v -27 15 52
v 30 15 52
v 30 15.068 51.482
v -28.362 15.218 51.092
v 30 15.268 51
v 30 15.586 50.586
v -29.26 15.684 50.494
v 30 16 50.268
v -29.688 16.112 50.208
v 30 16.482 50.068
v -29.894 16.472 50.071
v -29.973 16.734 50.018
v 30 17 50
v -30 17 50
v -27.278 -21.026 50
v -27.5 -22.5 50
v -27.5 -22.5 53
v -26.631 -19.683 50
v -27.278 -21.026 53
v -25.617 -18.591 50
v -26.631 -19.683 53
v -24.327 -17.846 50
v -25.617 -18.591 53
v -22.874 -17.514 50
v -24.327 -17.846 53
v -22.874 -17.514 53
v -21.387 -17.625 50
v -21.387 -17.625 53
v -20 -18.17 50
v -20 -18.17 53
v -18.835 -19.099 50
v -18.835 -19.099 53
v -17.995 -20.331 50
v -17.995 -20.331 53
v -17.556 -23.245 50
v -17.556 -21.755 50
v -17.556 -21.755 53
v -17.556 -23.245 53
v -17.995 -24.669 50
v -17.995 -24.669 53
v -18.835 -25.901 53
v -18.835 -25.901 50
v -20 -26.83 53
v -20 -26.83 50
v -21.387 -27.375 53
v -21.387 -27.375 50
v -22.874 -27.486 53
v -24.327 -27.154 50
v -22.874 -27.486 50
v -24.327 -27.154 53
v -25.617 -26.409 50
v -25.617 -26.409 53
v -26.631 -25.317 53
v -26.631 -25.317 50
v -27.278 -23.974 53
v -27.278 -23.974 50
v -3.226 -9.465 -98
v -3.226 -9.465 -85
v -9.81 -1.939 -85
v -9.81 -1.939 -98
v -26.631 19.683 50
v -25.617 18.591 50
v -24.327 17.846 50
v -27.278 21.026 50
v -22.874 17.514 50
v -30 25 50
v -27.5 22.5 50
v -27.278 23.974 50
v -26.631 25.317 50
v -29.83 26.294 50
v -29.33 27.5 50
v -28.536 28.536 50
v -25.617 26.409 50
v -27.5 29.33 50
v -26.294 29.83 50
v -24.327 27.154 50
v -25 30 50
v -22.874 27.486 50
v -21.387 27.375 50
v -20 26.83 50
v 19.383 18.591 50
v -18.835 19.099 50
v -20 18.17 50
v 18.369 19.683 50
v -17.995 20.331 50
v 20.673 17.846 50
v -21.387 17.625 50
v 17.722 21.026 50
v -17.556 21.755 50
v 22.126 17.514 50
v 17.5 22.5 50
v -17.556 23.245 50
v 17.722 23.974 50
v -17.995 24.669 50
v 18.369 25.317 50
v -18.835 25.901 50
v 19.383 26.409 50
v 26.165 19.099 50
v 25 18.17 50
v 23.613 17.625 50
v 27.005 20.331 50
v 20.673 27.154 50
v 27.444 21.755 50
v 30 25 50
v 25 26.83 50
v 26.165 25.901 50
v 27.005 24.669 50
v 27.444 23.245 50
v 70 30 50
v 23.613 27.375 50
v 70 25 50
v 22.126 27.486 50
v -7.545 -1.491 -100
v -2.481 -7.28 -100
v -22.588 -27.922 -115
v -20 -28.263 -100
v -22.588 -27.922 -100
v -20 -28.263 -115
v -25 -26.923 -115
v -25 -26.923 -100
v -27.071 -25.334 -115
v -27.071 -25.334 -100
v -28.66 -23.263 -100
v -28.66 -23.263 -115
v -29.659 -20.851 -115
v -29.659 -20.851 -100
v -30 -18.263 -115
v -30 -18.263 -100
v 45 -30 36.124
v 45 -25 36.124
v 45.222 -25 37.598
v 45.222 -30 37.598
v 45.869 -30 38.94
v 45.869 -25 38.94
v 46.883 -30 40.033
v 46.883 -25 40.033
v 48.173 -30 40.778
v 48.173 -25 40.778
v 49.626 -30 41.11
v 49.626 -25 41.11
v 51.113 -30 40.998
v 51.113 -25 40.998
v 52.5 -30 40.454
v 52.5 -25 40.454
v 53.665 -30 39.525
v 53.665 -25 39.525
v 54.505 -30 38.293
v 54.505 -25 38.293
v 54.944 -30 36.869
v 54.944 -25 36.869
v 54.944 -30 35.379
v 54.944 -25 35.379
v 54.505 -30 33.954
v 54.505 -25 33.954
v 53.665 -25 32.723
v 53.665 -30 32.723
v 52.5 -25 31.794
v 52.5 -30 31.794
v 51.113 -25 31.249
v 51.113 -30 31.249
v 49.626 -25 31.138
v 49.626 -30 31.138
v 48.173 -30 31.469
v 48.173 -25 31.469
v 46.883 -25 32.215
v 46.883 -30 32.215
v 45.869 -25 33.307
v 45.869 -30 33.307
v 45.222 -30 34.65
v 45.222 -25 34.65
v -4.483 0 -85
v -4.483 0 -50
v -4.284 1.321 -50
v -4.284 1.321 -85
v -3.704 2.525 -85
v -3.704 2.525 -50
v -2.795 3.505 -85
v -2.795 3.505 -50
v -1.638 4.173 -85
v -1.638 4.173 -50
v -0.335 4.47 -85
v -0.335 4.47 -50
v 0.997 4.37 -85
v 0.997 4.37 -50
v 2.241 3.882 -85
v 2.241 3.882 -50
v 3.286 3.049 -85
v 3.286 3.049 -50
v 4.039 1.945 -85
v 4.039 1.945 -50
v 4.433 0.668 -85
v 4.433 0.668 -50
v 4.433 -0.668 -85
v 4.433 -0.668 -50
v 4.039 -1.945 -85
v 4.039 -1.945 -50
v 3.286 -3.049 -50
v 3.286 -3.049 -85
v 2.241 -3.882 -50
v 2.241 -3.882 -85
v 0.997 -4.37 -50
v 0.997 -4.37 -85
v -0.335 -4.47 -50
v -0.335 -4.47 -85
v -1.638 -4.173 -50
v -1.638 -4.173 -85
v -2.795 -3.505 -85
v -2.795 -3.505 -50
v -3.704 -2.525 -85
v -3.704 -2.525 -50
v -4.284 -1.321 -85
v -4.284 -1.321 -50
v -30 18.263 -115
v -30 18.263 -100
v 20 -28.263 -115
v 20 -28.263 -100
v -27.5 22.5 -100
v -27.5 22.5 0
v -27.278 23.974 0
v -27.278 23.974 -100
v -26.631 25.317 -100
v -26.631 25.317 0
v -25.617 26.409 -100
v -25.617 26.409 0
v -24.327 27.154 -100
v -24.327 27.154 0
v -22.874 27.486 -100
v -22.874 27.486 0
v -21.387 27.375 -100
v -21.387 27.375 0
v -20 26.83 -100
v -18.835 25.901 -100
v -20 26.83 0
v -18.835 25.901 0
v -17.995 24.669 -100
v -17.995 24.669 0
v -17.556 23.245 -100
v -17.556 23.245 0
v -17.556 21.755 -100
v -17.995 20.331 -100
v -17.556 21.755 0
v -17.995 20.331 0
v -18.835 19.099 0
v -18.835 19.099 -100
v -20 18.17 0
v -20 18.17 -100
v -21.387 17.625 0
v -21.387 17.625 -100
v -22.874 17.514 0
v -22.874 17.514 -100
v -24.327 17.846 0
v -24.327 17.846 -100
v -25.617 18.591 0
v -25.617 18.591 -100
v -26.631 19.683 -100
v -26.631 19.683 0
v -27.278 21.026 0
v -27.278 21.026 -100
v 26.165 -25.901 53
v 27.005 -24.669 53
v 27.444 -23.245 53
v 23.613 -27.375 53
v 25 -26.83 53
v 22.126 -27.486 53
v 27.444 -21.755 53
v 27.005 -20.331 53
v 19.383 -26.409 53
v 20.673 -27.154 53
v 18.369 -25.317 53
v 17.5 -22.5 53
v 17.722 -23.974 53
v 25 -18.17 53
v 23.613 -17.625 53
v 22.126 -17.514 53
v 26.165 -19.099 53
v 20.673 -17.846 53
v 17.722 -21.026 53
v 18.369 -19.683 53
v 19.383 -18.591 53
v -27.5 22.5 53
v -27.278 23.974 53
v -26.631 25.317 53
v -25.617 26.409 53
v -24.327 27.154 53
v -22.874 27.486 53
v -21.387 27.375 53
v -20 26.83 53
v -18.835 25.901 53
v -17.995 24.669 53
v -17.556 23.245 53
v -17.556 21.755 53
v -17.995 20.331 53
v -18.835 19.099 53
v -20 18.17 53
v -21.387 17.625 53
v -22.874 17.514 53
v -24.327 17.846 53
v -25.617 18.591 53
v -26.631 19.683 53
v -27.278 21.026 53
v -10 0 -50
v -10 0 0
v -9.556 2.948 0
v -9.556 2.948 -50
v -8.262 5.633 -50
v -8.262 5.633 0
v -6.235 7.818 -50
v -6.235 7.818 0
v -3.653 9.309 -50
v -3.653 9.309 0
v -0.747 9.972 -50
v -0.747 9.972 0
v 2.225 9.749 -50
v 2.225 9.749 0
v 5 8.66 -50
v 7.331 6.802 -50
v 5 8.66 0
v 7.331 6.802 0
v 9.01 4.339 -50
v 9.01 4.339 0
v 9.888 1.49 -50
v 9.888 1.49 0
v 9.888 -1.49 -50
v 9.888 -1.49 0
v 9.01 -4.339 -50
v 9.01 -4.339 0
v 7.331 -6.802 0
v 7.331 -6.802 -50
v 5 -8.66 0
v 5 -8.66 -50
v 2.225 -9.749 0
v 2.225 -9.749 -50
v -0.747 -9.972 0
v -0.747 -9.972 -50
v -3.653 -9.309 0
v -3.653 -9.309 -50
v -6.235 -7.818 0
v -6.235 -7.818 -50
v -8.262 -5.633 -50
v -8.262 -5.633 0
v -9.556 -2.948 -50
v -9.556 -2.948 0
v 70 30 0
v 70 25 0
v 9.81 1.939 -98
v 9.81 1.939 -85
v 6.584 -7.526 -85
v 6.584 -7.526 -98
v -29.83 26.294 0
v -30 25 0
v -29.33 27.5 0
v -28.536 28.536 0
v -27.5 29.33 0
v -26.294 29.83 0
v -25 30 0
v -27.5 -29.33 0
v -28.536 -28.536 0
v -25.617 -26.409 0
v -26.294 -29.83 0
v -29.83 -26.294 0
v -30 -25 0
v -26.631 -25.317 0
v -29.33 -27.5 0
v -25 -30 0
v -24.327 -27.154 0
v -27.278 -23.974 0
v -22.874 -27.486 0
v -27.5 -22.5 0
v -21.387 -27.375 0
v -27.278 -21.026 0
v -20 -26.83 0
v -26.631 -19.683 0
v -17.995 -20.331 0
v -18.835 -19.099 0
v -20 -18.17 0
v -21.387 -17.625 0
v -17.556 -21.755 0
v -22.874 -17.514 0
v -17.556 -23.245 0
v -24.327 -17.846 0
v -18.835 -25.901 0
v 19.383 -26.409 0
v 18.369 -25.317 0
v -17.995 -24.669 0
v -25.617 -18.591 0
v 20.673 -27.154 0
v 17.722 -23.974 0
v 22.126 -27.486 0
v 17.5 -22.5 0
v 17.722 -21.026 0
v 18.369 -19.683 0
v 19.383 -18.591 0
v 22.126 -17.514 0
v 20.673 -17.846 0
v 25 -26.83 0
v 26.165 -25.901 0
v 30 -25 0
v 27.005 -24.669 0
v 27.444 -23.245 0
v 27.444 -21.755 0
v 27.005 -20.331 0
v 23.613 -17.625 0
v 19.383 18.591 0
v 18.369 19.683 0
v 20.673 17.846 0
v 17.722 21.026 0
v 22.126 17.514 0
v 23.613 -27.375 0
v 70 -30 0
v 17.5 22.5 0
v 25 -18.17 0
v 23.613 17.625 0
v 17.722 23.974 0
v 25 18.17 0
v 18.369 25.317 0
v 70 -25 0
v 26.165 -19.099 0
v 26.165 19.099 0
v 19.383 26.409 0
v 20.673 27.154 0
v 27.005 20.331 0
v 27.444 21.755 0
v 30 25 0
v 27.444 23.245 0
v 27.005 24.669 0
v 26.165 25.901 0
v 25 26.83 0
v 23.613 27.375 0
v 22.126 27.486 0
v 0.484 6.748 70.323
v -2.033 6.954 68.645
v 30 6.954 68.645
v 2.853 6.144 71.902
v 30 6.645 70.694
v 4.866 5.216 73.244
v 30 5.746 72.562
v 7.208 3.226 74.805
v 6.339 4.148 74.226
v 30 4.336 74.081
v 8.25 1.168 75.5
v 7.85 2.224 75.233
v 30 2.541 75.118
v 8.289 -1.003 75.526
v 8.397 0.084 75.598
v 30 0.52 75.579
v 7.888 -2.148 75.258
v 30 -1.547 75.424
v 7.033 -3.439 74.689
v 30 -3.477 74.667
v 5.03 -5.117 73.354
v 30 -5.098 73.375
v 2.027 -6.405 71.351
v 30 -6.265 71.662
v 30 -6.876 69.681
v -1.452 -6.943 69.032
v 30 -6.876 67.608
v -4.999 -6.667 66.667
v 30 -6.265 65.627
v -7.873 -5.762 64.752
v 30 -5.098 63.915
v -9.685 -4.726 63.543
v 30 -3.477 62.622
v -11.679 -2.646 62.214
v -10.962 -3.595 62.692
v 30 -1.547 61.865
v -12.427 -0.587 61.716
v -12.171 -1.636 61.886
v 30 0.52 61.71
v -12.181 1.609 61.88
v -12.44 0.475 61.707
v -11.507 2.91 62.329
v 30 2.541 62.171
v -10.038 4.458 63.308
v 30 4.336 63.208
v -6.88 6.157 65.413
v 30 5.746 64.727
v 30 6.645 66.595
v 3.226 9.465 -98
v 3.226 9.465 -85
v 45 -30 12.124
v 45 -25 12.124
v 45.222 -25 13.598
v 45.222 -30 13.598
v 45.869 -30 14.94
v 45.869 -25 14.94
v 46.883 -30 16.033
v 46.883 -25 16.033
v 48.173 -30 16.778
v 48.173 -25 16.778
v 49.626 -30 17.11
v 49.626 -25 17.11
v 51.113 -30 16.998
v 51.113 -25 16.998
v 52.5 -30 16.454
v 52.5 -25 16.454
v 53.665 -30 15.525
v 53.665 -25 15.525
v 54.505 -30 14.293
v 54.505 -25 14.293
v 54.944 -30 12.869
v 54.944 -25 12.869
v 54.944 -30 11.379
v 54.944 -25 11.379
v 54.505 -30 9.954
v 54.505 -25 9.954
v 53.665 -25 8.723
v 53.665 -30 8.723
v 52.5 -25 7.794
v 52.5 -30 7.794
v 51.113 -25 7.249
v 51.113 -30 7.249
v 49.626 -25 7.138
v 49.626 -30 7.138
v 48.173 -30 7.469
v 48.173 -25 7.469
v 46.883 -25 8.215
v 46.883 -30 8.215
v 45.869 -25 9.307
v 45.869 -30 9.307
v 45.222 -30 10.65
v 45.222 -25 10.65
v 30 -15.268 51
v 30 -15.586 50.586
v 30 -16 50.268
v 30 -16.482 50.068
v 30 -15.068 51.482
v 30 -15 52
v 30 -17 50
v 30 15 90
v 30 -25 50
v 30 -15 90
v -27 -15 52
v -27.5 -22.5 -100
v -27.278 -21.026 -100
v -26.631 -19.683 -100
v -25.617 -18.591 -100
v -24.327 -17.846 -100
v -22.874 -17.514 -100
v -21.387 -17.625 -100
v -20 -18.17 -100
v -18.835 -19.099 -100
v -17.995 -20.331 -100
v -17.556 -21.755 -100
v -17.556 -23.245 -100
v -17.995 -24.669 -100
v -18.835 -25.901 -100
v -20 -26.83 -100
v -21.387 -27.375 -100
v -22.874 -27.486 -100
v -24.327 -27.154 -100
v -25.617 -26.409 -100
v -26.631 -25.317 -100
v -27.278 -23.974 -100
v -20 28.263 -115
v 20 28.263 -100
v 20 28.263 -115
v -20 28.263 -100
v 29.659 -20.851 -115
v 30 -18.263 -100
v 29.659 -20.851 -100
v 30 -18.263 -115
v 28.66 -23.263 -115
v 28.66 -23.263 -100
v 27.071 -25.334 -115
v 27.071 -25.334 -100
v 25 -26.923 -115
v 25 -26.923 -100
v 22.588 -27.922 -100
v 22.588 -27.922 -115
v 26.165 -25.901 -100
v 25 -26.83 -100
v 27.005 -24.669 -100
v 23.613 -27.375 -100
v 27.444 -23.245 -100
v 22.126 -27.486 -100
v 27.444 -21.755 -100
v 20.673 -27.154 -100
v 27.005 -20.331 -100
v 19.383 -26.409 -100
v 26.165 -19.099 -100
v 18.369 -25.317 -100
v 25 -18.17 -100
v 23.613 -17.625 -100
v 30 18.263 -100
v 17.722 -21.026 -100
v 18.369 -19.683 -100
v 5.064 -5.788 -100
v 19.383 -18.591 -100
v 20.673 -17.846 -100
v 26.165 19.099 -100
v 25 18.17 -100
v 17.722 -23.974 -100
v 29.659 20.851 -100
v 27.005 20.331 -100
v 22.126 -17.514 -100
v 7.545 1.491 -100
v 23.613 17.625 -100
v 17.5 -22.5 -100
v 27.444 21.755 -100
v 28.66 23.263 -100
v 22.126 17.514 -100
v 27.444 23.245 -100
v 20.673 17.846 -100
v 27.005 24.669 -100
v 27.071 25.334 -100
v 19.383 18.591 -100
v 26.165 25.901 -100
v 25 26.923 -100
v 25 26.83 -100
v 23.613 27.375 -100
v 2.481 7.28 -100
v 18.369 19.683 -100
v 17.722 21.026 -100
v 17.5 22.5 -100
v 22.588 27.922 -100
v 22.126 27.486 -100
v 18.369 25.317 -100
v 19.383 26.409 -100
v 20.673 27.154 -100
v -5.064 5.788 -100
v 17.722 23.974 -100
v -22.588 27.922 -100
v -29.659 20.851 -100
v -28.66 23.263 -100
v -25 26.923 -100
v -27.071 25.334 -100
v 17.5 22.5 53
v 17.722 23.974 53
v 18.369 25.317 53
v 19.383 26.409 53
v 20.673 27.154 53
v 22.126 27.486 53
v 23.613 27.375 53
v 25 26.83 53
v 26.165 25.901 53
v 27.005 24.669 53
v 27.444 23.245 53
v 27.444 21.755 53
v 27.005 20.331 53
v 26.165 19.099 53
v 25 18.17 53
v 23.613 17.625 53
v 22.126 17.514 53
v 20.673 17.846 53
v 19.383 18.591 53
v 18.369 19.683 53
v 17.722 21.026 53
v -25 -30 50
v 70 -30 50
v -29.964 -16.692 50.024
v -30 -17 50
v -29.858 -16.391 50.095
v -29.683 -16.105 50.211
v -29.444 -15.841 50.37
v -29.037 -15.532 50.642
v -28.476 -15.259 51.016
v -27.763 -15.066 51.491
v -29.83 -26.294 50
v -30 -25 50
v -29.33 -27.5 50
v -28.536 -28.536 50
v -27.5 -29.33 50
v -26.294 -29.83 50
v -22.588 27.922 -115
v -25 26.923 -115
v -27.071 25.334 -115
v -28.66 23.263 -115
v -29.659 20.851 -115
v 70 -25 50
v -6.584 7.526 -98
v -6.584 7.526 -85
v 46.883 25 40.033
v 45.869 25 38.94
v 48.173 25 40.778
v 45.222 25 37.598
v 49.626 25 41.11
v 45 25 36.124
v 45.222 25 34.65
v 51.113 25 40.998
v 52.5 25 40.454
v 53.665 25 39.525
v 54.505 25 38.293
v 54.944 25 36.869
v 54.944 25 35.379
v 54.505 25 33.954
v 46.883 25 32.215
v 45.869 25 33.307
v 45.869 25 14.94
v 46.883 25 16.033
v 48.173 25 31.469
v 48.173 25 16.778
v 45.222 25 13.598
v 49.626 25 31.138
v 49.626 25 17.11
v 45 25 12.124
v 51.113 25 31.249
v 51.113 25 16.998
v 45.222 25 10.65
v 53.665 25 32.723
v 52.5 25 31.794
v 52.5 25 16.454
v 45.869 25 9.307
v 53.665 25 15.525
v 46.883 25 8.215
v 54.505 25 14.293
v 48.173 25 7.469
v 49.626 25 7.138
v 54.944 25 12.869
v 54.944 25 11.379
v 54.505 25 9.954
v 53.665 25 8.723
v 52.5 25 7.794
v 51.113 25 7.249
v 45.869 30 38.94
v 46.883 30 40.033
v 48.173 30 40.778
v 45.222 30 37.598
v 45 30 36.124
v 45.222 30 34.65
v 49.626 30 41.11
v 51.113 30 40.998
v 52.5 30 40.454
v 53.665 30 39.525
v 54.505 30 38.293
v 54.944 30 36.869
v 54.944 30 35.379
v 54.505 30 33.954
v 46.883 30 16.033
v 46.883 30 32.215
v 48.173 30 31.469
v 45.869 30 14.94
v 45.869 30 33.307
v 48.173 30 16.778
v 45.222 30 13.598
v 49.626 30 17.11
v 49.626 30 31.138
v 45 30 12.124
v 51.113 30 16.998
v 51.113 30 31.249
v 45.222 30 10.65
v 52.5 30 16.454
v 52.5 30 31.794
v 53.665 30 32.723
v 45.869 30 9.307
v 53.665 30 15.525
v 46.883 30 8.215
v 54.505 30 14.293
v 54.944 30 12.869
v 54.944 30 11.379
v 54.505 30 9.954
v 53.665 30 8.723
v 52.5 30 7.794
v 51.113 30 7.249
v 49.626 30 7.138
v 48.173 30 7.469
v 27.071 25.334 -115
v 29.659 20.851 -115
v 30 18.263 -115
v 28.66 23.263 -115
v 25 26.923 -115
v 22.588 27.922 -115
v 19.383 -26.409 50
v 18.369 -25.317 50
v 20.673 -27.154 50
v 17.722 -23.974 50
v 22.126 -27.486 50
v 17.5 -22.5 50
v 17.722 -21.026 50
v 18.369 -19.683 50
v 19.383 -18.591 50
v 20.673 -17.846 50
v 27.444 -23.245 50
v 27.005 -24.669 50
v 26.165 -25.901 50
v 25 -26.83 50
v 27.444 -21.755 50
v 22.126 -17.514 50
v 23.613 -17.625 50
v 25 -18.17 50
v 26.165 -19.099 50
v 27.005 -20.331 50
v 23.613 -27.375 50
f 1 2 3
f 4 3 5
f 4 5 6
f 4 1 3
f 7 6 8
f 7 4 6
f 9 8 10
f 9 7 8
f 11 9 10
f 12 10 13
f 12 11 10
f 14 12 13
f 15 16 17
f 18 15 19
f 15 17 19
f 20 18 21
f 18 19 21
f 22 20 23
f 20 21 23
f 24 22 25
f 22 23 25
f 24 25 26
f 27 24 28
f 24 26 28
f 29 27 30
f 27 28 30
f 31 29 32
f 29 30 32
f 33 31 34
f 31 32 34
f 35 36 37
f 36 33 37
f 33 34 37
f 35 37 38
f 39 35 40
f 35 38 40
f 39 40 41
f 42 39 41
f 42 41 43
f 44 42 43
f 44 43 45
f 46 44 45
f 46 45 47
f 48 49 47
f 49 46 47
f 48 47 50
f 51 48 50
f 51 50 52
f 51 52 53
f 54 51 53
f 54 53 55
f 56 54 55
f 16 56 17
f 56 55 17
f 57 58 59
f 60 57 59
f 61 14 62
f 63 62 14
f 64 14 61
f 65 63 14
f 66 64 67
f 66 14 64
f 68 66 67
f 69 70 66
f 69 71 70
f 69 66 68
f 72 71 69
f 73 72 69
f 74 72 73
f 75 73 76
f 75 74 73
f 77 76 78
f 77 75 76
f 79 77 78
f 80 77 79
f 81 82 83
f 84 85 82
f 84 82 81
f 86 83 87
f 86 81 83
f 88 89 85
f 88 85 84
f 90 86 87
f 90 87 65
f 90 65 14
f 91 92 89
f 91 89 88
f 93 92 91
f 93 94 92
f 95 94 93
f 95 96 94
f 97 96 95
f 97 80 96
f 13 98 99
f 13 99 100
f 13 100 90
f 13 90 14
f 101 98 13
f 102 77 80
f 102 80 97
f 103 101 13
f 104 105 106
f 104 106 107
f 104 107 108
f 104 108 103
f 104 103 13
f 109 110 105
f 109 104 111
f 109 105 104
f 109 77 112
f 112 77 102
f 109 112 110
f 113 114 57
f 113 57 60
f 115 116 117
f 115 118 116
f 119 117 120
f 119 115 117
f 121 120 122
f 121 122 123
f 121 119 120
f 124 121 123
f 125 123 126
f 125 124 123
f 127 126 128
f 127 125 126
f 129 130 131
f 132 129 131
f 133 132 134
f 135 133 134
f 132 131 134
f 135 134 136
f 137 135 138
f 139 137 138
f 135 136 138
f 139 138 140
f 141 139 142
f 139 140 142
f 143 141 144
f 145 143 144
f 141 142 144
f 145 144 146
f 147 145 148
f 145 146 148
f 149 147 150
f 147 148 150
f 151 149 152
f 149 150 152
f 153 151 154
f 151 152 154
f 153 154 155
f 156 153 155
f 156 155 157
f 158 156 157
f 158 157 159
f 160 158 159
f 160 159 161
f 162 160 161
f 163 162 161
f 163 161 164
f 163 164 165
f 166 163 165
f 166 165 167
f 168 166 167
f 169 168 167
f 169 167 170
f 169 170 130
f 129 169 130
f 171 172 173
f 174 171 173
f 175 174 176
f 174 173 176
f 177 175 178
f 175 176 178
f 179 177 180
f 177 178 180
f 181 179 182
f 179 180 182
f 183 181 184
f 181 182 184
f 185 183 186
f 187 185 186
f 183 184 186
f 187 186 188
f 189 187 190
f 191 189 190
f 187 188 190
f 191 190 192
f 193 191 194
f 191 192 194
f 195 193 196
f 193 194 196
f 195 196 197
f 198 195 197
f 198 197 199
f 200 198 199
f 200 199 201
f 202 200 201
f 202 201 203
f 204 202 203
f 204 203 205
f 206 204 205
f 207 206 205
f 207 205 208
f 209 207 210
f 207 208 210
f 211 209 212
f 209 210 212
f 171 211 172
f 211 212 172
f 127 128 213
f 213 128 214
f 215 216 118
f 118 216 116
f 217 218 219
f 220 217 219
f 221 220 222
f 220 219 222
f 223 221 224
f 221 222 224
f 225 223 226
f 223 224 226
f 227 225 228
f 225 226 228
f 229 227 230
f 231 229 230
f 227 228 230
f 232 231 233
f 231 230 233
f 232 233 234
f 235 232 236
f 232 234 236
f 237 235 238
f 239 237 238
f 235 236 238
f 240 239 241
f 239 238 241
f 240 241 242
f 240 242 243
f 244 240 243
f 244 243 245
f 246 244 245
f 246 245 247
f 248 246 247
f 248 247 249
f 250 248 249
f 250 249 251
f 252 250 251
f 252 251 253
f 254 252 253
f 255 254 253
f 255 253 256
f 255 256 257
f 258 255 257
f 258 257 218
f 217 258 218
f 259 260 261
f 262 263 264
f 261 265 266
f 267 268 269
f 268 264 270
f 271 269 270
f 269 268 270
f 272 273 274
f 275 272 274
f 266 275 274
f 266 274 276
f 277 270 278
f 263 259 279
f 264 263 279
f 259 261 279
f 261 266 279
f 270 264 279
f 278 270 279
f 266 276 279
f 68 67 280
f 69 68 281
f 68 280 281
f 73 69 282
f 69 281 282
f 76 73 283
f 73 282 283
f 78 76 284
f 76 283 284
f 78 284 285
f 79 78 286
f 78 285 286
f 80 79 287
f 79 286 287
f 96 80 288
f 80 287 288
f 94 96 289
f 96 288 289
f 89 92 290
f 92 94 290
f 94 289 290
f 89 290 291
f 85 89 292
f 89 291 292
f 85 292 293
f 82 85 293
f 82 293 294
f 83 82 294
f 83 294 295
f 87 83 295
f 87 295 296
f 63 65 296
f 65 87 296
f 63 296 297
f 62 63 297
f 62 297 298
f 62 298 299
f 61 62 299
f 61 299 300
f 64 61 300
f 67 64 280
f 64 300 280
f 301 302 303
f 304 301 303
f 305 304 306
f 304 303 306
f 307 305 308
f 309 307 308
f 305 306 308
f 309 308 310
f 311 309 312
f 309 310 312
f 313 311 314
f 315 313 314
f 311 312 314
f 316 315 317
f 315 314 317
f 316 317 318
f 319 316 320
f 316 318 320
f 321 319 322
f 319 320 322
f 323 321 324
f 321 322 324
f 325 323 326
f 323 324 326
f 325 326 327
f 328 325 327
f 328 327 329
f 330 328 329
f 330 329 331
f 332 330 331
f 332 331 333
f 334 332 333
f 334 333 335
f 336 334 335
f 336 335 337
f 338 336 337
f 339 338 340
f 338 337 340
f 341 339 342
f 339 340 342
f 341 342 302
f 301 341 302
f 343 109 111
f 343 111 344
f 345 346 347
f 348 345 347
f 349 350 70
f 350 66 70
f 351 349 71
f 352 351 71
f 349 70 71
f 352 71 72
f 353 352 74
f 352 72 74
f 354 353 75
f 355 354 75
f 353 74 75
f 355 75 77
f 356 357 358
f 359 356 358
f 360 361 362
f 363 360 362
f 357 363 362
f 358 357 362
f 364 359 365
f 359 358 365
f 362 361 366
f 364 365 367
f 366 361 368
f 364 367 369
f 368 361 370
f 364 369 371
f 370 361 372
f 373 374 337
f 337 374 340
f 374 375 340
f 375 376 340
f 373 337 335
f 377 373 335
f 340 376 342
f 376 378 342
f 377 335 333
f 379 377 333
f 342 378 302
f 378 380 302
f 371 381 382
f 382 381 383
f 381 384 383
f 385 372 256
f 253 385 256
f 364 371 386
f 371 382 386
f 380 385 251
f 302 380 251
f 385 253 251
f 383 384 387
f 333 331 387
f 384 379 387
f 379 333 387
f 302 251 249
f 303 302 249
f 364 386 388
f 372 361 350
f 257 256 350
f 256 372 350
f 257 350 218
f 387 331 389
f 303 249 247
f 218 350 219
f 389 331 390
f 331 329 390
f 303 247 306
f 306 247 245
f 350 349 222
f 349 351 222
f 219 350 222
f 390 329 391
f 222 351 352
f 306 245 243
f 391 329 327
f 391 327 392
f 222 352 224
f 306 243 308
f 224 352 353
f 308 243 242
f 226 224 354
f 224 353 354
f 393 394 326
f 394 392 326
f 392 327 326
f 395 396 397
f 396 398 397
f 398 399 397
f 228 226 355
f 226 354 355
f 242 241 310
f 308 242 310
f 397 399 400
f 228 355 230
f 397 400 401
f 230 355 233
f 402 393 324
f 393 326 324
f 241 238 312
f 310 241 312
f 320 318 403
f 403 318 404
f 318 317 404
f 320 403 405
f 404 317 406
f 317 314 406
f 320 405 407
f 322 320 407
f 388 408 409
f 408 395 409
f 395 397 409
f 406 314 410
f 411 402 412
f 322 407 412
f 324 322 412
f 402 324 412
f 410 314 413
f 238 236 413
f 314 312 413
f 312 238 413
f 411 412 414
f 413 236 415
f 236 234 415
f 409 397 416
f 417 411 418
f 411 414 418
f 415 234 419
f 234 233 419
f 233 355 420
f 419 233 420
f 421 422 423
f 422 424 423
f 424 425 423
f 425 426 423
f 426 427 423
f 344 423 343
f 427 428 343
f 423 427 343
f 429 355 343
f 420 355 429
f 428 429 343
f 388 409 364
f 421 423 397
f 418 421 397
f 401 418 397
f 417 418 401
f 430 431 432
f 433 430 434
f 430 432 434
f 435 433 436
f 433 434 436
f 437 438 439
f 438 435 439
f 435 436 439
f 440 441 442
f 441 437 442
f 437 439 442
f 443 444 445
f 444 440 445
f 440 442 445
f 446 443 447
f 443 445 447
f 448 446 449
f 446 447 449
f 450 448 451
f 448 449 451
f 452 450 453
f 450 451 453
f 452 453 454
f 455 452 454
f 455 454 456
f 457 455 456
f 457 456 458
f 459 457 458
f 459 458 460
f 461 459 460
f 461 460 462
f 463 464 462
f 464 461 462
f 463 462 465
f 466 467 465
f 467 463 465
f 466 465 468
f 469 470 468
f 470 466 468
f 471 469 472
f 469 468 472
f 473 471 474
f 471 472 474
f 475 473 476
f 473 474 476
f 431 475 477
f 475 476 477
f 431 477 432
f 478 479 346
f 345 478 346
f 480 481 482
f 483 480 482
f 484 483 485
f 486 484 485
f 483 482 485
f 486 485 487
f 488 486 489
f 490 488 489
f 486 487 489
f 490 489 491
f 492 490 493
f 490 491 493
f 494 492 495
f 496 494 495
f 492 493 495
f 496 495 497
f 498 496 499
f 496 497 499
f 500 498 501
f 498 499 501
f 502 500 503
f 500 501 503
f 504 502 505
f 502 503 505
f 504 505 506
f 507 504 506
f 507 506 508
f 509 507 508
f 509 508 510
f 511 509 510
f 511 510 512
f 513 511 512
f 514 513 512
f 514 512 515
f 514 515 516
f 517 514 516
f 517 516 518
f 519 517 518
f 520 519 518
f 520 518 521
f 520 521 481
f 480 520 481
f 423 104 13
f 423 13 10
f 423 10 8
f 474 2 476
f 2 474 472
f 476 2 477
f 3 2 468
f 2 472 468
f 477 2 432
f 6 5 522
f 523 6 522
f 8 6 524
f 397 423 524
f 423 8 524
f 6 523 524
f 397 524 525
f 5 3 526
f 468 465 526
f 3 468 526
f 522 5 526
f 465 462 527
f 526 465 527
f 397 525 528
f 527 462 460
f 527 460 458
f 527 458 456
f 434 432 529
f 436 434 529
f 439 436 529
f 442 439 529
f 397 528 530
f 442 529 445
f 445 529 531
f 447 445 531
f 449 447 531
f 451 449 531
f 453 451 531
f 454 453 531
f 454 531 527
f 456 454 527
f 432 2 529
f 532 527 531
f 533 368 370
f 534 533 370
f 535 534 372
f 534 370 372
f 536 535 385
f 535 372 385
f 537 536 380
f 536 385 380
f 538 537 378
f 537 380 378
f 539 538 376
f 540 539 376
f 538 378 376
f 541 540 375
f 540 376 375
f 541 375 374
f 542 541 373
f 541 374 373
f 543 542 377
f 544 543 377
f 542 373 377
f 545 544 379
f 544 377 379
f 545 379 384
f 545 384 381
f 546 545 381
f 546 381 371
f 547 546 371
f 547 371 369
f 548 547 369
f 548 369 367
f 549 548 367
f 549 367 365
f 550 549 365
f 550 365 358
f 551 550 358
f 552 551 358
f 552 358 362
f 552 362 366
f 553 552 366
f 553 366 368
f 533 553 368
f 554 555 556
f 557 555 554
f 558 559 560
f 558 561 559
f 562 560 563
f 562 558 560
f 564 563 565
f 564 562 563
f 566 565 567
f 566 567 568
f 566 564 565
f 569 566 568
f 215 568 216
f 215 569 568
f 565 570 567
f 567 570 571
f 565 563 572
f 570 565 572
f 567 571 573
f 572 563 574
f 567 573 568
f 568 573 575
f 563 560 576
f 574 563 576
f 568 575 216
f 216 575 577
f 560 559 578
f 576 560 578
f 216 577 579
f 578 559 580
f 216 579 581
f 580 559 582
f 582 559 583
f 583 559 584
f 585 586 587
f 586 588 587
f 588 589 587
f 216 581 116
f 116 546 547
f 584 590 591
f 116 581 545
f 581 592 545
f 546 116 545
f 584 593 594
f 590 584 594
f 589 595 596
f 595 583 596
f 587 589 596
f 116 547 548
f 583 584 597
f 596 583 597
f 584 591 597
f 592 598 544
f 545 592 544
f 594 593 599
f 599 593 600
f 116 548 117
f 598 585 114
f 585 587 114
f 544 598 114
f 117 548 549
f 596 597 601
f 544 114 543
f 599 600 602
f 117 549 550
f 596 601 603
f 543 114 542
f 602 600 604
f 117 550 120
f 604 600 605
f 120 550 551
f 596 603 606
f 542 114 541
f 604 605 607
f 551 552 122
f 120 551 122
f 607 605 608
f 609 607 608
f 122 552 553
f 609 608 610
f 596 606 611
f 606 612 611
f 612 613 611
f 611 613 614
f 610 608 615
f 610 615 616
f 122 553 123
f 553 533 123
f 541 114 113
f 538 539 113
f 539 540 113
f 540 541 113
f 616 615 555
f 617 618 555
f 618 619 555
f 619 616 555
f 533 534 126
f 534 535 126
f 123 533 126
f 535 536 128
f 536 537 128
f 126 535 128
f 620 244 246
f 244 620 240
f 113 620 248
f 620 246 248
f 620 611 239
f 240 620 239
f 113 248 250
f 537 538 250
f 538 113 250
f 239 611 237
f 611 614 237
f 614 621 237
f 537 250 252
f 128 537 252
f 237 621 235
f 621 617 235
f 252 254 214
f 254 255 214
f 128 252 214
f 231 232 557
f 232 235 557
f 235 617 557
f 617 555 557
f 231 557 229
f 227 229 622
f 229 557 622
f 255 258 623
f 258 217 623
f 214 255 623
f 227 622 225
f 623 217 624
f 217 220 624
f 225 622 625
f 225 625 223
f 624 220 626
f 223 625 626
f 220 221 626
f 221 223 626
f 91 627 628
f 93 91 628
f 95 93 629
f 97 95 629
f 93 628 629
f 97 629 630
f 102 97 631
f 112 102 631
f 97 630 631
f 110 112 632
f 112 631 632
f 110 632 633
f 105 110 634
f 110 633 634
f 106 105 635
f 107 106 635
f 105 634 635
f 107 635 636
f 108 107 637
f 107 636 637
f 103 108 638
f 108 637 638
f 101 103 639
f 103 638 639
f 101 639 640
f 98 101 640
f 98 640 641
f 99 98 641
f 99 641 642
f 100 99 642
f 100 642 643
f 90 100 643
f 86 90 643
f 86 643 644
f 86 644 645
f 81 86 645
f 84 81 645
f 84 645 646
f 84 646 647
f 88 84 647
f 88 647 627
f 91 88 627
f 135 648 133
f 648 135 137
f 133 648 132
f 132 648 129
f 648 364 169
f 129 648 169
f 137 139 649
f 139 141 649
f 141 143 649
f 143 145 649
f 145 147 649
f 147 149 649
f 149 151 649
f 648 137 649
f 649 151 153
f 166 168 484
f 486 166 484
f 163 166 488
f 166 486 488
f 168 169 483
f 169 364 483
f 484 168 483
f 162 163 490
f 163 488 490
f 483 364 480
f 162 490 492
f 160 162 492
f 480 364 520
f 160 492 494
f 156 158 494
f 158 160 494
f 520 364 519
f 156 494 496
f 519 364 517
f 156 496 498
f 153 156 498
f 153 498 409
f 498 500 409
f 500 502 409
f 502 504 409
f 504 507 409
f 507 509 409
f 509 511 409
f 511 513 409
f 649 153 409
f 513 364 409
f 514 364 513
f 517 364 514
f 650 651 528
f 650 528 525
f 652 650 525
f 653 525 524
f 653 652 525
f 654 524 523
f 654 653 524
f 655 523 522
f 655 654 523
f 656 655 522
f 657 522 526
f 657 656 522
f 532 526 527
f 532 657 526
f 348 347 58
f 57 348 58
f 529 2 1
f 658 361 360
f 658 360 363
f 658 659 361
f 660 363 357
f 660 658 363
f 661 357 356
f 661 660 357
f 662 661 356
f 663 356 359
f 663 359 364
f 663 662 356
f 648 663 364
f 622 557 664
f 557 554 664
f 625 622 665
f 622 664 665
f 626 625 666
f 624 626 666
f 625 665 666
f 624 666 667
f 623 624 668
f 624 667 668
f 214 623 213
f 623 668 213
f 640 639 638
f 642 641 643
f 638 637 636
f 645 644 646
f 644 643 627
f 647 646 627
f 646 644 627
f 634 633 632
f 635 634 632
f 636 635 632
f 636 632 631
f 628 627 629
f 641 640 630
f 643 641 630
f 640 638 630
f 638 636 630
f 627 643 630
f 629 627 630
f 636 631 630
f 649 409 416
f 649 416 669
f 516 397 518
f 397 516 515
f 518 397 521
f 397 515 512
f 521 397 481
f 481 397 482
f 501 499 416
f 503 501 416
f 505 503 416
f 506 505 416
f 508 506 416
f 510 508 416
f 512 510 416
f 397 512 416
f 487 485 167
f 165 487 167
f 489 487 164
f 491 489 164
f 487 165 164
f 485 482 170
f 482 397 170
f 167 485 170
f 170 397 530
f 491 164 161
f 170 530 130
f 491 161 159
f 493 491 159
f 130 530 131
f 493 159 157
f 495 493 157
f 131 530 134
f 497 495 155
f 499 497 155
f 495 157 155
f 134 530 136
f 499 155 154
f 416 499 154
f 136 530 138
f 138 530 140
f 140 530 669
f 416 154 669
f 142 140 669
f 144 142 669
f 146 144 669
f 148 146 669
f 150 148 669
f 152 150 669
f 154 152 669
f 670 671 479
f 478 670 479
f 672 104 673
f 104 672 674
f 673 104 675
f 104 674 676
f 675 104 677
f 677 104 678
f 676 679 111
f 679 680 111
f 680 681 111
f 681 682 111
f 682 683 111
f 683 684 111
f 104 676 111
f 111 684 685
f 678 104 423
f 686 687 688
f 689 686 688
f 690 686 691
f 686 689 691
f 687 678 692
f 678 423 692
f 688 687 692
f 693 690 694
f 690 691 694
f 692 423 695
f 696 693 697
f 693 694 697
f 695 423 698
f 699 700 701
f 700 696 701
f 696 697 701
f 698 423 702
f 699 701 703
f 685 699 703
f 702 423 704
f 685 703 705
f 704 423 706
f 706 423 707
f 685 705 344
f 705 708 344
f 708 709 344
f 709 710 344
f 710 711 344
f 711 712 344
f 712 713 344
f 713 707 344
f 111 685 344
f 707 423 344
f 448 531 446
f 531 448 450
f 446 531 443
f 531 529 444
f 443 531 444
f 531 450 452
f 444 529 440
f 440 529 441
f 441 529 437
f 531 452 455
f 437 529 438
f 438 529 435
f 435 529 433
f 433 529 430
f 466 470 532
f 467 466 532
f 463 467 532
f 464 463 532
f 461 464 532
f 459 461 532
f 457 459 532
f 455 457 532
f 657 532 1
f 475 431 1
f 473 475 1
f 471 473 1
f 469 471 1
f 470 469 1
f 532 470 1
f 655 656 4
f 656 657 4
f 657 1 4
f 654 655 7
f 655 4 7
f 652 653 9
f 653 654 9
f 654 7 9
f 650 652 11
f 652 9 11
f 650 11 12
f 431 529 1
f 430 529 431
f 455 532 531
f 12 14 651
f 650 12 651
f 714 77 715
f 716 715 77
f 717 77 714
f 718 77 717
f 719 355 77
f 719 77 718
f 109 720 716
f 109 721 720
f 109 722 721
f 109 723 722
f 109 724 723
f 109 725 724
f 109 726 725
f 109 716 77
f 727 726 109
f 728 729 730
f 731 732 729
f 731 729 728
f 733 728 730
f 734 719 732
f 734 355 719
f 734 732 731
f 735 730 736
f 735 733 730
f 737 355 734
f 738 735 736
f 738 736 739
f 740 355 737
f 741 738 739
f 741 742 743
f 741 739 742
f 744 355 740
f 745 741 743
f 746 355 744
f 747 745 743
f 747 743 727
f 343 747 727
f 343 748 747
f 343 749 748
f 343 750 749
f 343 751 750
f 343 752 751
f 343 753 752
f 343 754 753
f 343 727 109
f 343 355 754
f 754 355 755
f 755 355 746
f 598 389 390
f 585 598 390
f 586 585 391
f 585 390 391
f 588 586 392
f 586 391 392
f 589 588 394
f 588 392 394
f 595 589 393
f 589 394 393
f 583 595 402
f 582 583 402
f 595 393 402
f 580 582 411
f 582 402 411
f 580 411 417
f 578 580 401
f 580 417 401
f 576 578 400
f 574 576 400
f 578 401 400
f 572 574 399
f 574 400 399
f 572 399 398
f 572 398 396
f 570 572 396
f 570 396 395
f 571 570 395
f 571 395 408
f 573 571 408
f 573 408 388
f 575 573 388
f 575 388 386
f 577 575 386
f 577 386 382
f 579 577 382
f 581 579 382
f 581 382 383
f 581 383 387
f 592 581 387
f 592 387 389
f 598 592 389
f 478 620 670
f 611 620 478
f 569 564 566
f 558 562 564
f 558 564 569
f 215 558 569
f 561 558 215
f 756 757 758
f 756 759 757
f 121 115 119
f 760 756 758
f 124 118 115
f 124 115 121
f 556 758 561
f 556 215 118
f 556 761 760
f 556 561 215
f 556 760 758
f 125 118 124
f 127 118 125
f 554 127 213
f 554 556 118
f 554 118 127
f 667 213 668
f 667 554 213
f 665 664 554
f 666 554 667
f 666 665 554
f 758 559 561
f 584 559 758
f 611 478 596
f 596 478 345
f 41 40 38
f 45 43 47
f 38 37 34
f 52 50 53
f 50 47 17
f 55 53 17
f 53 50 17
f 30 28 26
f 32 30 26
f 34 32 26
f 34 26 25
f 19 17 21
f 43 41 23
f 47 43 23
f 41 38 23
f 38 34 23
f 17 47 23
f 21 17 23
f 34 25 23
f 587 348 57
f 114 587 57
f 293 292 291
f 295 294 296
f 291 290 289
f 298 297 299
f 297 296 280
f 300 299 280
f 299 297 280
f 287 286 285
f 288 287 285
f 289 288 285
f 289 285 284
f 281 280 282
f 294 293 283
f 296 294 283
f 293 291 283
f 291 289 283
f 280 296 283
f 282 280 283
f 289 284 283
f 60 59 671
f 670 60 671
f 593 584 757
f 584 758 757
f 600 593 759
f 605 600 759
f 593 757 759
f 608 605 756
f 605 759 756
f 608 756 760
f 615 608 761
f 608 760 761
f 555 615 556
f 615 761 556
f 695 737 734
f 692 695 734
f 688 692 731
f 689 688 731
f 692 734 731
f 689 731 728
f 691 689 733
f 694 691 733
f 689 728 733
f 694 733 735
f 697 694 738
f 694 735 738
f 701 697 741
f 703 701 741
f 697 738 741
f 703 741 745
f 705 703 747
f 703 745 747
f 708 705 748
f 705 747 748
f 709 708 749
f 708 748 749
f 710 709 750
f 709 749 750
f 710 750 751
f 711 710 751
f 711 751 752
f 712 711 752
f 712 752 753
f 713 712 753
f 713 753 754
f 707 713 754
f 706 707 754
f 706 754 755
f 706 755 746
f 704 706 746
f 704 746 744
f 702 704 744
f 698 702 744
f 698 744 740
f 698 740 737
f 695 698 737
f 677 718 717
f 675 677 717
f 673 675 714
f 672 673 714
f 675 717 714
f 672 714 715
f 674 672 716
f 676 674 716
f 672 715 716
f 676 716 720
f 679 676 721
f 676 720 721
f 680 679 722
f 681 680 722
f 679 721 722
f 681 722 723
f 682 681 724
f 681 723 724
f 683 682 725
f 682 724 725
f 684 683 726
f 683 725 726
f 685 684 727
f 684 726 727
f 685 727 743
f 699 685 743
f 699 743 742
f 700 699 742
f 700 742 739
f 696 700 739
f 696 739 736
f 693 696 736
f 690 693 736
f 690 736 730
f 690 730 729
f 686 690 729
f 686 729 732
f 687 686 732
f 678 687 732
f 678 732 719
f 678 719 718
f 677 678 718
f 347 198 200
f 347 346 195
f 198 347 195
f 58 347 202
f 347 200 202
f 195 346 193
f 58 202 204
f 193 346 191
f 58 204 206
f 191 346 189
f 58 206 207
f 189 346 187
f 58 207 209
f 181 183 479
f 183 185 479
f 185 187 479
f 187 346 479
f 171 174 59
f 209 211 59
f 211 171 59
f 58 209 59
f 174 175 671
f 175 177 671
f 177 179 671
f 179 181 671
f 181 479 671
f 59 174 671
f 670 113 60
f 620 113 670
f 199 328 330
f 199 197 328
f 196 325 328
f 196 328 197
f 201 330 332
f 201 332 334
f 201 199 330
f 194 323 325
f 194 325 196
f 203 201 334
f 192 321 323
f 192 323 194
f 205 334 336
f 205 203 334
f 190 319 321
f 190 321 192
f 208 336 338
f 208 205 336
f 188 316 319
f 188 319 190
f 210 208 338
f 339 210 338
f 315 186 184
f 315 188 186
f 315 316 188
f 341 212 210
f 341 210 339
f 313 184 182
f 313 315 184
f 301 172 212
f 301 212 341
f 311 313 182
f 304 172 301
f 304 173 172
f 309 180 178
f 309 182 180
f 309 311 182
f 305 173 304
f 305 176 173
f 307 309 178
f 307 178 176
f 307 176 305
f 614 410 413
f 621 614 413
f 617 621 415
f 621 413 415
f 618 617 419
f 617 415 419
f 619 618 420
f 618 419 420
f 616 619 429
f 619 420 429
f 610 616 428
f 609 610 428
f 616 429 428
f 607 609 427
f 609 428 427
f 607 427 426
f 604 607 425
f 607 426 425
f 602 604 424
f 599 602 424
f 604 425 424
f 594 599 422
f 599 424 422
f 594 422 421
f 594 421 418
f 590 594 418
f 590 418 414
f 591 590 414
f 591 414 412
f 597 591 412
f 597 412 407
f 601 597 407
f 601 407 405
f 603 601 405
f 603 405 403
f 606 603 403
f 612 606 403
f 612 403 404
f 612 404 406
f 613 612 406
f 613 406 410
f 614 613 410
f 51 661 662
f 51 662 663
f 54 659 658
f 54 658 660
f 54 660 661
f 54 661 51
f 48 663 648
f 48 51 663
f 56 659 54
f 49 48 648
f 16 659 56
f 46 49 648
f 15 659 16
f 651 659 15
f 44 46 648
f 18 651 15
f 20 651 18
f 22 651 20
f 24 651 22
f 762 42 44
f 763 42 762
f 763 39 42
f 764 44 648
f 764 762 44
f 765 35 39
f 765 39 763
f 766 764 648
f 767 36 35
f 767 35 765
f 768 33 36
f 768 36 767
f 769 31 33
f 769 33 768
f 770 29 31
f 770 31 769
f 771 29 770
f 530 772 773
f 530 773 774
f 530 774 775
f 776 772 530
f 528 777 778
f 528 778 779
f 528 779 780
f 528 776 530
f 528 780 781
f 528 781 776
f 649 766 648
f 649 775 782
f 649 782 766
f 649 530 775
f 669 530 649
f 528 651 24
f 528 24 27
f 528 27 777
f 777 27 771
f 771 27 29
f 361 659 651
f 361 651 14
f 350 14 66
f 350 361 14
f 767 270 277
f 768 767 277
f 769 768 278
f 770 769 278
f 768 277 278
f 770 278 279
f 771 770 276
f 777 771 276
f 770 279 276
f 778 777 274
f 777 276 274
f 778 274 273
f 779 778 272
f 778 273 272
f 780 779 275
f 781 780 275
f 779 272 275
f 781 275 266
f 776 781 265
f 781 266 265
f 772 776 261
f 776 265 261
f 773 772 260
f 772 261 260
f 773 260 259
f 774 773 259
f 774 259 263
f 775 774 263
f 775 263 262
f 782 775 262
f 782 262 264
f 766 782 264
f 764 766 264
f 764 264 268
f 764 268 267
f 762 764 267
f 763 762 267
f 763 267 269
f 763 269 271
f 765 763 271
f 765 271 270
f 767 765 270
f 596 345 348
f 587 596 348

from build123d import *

# Parameters (mm, degrees)
IZIM1_W                          = 60
IZIM1_H                          = 60
Y_KSEKLIK_EKSTR_ZYON1_DEPTH      = 50
IZIM2_R                          = 10
Y_KSEKLIK_EKSTR_ZYON2_DEPTH      = 50
IZIM3_R                          = 4.482666428
Y_KSEKLIK_EKSTR_ZYON3_DEPTH      = 35
Y_KSEKLIK_EKSTR_ZYON4_DEPTH      = 15
PAH1_SIZE                        = 2
Y_KSEKLIK_EKSTR_ZYON7_DEPTH      = 100
Y_KSEKLIK_EKSTR_ZYON7_DEPTH_BACK = 53
IZIM8_R                          = 5
IZIM9_W                          = 60
IZIM9_H                          = 56.52547631
Y_KSEKLIK_EKSTR_ZYON8_DEPTH      = 15
RADYUS2_R                        = 10
Y_KSEKLIK_EKSTR_ZYON9_DEPTH      = 15
Y_KSEKLIK_EKSTR_ZYON9_DEPTH_BACK = 15
IZIM11_R                         = 6.953917593
KES_EKSTR_ZYON1_DEPTH            = 75
RADYUS3_R                        = 5
IZIM12_W                         = 45
IZIM12_H                         = 50
Y_KSEKLIK_EKSTR_ZYON10_DEPTH     = 5
IZIM13_W                         = 45
IZIM13_H                         = 50
Y_KSEKLIK_EKSTR_ZYON11_DEPTH     = 5
IZIM14_R                         = 5
KES_EKSTR_ZYON2_DEPTH            = 98
RADYUS4_R                        = 2


with BuildPart() as part:
    # Çizim1 → Yükseklik-Ekstrüzyon1 (new body)
    with BuildSketch(Plane.XY):
        Rectangle(IZIM1_W, IZIM1_H)
    extrude(amount=Y_KSEKLIK_EKSTR_ZYON1_DEPTH)

    # Çizim2 → Yükseklik-Ekstrüzyon2 (add)
    with BuildSketch(Plane(origin=(0, 0, 0), x_dir=(-1, 0, 0), z_dir=(0, 0, -1))):
        Circle(IZIM2_R)
    extrude(amount=Y_KSEKLIK_EKSTR_ZYON2_DEPTH)

    # Çizim3 → Yükseklik-Ekstrüzyon3 (add)
    with BuildSketch(Plane(origin=(0, 0, -50), x_dir=(-1, 0, 0), z_dir=(0, 0, -1))):
        Circle(IZIM3_R)
    extrude(amount=Y_KSEKLIK_EKSTR_ZYON3_DEPTH)

    # Çizim4 → Yükseklik-Ekstrüzyon4 (add)
    with BuildSketch(Plane(origin=(0, 0, -85), x_dir=(-1, 0, 0), z_dir=(0, 0, -1))):
        Polygon((9.810169594, -1.939219571), (6.584498209, 7.526246298), (-3.225671385, 9.465465869), (-9.810169594, 1.939219571), (-6.584498209, -7.526246298), (3.225671385, -9.465465869), align=None)
    extrude(amount=Y_KSEKLIK_EKSTR_ZYON4_DEPTH)

    # Pah1
    pah1_edges = [part.edges().sort_by_distance(p)[0] for p in [
        (-6.517920489, -5.70234272, -100),
        (-8.197333901, 2.793513364, -100),
        (-1.679413412, 8.495856084, -100),
        (6.517920489, 5.70234272, -100),
        (8.197333901, -2.793513364, -100),
        (1.679413412, -8.495856084, -100),
    ]]
    chamfer(pah1_edges, length=PAH1_SIZE)

    # Çizim8 → Yükseklik-Ekstrüzyon7 (add, two sides: drawn at the far end of the back side and taken through both)
    with BuildSketch(Plane(origin=(0, 0, 0), x_dir=(-1, 0, 0), z_dir=(0, 0, -1)).offset(-Y_KSEKLIK_EKSTR_ZYON7_DEPTH_BACK)):
        with Locations((-22.5, 22.5)):
            Circle(IZIM8_R)
        with Locations((22.5, 22.5)):
            Circle(IZIM8_R)
        with Locations((22.5, -22.5)):
            Circle(IZIM8_R)
        with Locations((-22.5, -22.5)):
            Circle(IZIM8_R)
    extrude(amount=Y_KSEKLIK_EKSTR_ZYON7_DEPTH + Y_KSEKLIK_EKSTR_ZYON7_DEPTH_BACK)

    # Çizim9 → Yükseklik-Ekstrüzyon8 (add)
    with BuildSketch(Plane(origin=(0, 0, -100), x_dir=(-1, 0, 0), z_dir=(0, 0, -1))):
        Rectangle(IZIM9_W, IZIM9_H)
    extrude(amount=Y_KSEKLIK_EKSTR_ZYON8_DEPTH)

    # Radyus2
    radyus2_edges = [part.edges().sort_by_distance(p)[0] for p in [
        (30, 28.262738155, -107.5),
        (30, -28.262738155, -107.5),
        (-30, -28.262738155, -107.5),
        (-30, 28.262738155, -107.5),
    ]]
    fillet(radyus2_edges, radius=RADYUS2_R)

    # Çizim10 → Yükseklik-Ekstrüzyon9 (add, two sides: drawn at the far end of the back side and taken through both)
    with BuildSketch(Plane(origin=(0, 0, 0), x_dir=(1, 0, 0), z_dir=(0, 1, 0)).offset(-Y_KSEKLIK_EKSTR_ZYON9_DEPTH_BACK)):
        Polygon((30, -50), (30, -90), (-30, -50), align=None)
    extrude(amount=Y_KSEKLIK_EKSTR_ZYON9_DEPTH + Y_KSEKLIK_EKSTR_ZYON9_DEPTH_BACK)

    # Çizim11 → Kes-Ekstrüzyon1 (cut)
    with BuildSketch(Plane(origin=(30, 0, 0), x_dir=(0, 0, -1), z_dir=(1, 0, 0))):
        with Locations(Location((-68.644638819, 0, 0), (0, 0, 90))):
            Circle(IZIM11_R)
    extrude(amount=-KES_EKSTR_ZYON1_DEPTH, mode=Mode.SUBTRACT)

    # Radyus3
    radyus3_edges = [part.edges().sort_by_distance(p)[0] for p in [
        (-30, 30, 25),
        (30, 30, 25),
        (30, -30, 25),
        (-30, -30, 25),
    ]]
    fillet(radyus3_edges, radius=RADYUS3_R)

    # Çizim12 → Yükseklik-Ekstrüzyon10 (add)
    with BuildSketch(Plane.XZ.offset(30)):
        with Locations((47.5, 25)):
            Rectangle(IZIM12_W, IZIM12_H)
    extrude(amount=-Y_KSEKLIK_EKSTR_ZYON10_DEPTH)

    # Çizim13 → Yükseklik-Ekstrüzyon11 (add)
    with BuildSketch(Plane(origin=(0, 30, 0), x_dir=(1, 0, 0), z_dir=(0, 1, 0))):
        with Locations((47.5, -25)):
            Rectangle(IZIM13_W, IZIM13_H)
    extrude(amount=-Y_KSEKLIK_EKSTR_ZYON11_DEPTH)

    # Çizim14 → Kes-Ekstrüzyon2 (cut)
    with BuildSketch(Plane(origin=(0, 30, 0), x_dir=(1, 0, 0), z_dir=(0, 1, 0))):
        with Locations(Location((50, -12.123765205, 0), (0, 0, 180))):
            Circle(IZIM14_R)
        with Locations(Location((50, -36.123765205, 0), (0, 0, 180))):
            Circle(IZIM14_R)
    extrude(amount=-KES_EKSTR_ZYON2_DEPTH, mode=Mode.SUBTRACT)

    # Radyus4
    # the kernel refuses this fillet: 2 mm, written as the material it adds along each edge
    with BuildSketch(Plane(origin=(-30, -15, 50), x_dir=(0, -1, 0), z_dir=(1, 0, 0))) as radyus4_piece_1_section:
        with BuildLine():
            CenterArc((RADYUS4_R, -RADYUS4_R), RADYUS4_R, 90, 90)
            Line((0, -RADYUS4_R), (0, 0))
            Line((0, 0), (RADYUS4_R, 0))
        make_face()
    radyus4_piece_1 = extrude(amount=60, mode=Mode.PRIVATE)
    radyus4_piece_1 = split(radyus4_piece_1, bisect_by=Plane(origin=(-8.790437834, -15.455546118, 64.139708111), z_dir=(0.5547001962252291, 0, -0.8320502943378437)), keep=Keep.TOP, mode=Mode.PRIVATE)
    add(radyus4_piece_1)
    with BuildSketch(Plane(origin=(-30, 15, 50), x_dir=(0, 1, 0), z_dir=(1, 0, 0))) as radyus4_piece_2_section:
        with BuildLine():
            CenterArc((RADYUS4_R, RADYUS4_R), RADYUS4_R, 180, 90)
            Line((0, RADYUS4_R), (0, 0))
            Line((0, 0), (RADYUS4_R, 0))
        make_face()
    radyus4_piece_2 = extrude(amount=60, mode=Mode.PRIVATE)
    radyus4_piece_2 = split(radyus4_piece_2, bisect_by=Plane(origin=(-8.790437834, 15.455546118, 64.139708111), z_dir=(0.5547001962252291, 0, -0.8320502943378437)), keep=Keep.TOP, mode=Mode.PRIVATE)
    add(radyus4_piece_2)


solid = part.part
